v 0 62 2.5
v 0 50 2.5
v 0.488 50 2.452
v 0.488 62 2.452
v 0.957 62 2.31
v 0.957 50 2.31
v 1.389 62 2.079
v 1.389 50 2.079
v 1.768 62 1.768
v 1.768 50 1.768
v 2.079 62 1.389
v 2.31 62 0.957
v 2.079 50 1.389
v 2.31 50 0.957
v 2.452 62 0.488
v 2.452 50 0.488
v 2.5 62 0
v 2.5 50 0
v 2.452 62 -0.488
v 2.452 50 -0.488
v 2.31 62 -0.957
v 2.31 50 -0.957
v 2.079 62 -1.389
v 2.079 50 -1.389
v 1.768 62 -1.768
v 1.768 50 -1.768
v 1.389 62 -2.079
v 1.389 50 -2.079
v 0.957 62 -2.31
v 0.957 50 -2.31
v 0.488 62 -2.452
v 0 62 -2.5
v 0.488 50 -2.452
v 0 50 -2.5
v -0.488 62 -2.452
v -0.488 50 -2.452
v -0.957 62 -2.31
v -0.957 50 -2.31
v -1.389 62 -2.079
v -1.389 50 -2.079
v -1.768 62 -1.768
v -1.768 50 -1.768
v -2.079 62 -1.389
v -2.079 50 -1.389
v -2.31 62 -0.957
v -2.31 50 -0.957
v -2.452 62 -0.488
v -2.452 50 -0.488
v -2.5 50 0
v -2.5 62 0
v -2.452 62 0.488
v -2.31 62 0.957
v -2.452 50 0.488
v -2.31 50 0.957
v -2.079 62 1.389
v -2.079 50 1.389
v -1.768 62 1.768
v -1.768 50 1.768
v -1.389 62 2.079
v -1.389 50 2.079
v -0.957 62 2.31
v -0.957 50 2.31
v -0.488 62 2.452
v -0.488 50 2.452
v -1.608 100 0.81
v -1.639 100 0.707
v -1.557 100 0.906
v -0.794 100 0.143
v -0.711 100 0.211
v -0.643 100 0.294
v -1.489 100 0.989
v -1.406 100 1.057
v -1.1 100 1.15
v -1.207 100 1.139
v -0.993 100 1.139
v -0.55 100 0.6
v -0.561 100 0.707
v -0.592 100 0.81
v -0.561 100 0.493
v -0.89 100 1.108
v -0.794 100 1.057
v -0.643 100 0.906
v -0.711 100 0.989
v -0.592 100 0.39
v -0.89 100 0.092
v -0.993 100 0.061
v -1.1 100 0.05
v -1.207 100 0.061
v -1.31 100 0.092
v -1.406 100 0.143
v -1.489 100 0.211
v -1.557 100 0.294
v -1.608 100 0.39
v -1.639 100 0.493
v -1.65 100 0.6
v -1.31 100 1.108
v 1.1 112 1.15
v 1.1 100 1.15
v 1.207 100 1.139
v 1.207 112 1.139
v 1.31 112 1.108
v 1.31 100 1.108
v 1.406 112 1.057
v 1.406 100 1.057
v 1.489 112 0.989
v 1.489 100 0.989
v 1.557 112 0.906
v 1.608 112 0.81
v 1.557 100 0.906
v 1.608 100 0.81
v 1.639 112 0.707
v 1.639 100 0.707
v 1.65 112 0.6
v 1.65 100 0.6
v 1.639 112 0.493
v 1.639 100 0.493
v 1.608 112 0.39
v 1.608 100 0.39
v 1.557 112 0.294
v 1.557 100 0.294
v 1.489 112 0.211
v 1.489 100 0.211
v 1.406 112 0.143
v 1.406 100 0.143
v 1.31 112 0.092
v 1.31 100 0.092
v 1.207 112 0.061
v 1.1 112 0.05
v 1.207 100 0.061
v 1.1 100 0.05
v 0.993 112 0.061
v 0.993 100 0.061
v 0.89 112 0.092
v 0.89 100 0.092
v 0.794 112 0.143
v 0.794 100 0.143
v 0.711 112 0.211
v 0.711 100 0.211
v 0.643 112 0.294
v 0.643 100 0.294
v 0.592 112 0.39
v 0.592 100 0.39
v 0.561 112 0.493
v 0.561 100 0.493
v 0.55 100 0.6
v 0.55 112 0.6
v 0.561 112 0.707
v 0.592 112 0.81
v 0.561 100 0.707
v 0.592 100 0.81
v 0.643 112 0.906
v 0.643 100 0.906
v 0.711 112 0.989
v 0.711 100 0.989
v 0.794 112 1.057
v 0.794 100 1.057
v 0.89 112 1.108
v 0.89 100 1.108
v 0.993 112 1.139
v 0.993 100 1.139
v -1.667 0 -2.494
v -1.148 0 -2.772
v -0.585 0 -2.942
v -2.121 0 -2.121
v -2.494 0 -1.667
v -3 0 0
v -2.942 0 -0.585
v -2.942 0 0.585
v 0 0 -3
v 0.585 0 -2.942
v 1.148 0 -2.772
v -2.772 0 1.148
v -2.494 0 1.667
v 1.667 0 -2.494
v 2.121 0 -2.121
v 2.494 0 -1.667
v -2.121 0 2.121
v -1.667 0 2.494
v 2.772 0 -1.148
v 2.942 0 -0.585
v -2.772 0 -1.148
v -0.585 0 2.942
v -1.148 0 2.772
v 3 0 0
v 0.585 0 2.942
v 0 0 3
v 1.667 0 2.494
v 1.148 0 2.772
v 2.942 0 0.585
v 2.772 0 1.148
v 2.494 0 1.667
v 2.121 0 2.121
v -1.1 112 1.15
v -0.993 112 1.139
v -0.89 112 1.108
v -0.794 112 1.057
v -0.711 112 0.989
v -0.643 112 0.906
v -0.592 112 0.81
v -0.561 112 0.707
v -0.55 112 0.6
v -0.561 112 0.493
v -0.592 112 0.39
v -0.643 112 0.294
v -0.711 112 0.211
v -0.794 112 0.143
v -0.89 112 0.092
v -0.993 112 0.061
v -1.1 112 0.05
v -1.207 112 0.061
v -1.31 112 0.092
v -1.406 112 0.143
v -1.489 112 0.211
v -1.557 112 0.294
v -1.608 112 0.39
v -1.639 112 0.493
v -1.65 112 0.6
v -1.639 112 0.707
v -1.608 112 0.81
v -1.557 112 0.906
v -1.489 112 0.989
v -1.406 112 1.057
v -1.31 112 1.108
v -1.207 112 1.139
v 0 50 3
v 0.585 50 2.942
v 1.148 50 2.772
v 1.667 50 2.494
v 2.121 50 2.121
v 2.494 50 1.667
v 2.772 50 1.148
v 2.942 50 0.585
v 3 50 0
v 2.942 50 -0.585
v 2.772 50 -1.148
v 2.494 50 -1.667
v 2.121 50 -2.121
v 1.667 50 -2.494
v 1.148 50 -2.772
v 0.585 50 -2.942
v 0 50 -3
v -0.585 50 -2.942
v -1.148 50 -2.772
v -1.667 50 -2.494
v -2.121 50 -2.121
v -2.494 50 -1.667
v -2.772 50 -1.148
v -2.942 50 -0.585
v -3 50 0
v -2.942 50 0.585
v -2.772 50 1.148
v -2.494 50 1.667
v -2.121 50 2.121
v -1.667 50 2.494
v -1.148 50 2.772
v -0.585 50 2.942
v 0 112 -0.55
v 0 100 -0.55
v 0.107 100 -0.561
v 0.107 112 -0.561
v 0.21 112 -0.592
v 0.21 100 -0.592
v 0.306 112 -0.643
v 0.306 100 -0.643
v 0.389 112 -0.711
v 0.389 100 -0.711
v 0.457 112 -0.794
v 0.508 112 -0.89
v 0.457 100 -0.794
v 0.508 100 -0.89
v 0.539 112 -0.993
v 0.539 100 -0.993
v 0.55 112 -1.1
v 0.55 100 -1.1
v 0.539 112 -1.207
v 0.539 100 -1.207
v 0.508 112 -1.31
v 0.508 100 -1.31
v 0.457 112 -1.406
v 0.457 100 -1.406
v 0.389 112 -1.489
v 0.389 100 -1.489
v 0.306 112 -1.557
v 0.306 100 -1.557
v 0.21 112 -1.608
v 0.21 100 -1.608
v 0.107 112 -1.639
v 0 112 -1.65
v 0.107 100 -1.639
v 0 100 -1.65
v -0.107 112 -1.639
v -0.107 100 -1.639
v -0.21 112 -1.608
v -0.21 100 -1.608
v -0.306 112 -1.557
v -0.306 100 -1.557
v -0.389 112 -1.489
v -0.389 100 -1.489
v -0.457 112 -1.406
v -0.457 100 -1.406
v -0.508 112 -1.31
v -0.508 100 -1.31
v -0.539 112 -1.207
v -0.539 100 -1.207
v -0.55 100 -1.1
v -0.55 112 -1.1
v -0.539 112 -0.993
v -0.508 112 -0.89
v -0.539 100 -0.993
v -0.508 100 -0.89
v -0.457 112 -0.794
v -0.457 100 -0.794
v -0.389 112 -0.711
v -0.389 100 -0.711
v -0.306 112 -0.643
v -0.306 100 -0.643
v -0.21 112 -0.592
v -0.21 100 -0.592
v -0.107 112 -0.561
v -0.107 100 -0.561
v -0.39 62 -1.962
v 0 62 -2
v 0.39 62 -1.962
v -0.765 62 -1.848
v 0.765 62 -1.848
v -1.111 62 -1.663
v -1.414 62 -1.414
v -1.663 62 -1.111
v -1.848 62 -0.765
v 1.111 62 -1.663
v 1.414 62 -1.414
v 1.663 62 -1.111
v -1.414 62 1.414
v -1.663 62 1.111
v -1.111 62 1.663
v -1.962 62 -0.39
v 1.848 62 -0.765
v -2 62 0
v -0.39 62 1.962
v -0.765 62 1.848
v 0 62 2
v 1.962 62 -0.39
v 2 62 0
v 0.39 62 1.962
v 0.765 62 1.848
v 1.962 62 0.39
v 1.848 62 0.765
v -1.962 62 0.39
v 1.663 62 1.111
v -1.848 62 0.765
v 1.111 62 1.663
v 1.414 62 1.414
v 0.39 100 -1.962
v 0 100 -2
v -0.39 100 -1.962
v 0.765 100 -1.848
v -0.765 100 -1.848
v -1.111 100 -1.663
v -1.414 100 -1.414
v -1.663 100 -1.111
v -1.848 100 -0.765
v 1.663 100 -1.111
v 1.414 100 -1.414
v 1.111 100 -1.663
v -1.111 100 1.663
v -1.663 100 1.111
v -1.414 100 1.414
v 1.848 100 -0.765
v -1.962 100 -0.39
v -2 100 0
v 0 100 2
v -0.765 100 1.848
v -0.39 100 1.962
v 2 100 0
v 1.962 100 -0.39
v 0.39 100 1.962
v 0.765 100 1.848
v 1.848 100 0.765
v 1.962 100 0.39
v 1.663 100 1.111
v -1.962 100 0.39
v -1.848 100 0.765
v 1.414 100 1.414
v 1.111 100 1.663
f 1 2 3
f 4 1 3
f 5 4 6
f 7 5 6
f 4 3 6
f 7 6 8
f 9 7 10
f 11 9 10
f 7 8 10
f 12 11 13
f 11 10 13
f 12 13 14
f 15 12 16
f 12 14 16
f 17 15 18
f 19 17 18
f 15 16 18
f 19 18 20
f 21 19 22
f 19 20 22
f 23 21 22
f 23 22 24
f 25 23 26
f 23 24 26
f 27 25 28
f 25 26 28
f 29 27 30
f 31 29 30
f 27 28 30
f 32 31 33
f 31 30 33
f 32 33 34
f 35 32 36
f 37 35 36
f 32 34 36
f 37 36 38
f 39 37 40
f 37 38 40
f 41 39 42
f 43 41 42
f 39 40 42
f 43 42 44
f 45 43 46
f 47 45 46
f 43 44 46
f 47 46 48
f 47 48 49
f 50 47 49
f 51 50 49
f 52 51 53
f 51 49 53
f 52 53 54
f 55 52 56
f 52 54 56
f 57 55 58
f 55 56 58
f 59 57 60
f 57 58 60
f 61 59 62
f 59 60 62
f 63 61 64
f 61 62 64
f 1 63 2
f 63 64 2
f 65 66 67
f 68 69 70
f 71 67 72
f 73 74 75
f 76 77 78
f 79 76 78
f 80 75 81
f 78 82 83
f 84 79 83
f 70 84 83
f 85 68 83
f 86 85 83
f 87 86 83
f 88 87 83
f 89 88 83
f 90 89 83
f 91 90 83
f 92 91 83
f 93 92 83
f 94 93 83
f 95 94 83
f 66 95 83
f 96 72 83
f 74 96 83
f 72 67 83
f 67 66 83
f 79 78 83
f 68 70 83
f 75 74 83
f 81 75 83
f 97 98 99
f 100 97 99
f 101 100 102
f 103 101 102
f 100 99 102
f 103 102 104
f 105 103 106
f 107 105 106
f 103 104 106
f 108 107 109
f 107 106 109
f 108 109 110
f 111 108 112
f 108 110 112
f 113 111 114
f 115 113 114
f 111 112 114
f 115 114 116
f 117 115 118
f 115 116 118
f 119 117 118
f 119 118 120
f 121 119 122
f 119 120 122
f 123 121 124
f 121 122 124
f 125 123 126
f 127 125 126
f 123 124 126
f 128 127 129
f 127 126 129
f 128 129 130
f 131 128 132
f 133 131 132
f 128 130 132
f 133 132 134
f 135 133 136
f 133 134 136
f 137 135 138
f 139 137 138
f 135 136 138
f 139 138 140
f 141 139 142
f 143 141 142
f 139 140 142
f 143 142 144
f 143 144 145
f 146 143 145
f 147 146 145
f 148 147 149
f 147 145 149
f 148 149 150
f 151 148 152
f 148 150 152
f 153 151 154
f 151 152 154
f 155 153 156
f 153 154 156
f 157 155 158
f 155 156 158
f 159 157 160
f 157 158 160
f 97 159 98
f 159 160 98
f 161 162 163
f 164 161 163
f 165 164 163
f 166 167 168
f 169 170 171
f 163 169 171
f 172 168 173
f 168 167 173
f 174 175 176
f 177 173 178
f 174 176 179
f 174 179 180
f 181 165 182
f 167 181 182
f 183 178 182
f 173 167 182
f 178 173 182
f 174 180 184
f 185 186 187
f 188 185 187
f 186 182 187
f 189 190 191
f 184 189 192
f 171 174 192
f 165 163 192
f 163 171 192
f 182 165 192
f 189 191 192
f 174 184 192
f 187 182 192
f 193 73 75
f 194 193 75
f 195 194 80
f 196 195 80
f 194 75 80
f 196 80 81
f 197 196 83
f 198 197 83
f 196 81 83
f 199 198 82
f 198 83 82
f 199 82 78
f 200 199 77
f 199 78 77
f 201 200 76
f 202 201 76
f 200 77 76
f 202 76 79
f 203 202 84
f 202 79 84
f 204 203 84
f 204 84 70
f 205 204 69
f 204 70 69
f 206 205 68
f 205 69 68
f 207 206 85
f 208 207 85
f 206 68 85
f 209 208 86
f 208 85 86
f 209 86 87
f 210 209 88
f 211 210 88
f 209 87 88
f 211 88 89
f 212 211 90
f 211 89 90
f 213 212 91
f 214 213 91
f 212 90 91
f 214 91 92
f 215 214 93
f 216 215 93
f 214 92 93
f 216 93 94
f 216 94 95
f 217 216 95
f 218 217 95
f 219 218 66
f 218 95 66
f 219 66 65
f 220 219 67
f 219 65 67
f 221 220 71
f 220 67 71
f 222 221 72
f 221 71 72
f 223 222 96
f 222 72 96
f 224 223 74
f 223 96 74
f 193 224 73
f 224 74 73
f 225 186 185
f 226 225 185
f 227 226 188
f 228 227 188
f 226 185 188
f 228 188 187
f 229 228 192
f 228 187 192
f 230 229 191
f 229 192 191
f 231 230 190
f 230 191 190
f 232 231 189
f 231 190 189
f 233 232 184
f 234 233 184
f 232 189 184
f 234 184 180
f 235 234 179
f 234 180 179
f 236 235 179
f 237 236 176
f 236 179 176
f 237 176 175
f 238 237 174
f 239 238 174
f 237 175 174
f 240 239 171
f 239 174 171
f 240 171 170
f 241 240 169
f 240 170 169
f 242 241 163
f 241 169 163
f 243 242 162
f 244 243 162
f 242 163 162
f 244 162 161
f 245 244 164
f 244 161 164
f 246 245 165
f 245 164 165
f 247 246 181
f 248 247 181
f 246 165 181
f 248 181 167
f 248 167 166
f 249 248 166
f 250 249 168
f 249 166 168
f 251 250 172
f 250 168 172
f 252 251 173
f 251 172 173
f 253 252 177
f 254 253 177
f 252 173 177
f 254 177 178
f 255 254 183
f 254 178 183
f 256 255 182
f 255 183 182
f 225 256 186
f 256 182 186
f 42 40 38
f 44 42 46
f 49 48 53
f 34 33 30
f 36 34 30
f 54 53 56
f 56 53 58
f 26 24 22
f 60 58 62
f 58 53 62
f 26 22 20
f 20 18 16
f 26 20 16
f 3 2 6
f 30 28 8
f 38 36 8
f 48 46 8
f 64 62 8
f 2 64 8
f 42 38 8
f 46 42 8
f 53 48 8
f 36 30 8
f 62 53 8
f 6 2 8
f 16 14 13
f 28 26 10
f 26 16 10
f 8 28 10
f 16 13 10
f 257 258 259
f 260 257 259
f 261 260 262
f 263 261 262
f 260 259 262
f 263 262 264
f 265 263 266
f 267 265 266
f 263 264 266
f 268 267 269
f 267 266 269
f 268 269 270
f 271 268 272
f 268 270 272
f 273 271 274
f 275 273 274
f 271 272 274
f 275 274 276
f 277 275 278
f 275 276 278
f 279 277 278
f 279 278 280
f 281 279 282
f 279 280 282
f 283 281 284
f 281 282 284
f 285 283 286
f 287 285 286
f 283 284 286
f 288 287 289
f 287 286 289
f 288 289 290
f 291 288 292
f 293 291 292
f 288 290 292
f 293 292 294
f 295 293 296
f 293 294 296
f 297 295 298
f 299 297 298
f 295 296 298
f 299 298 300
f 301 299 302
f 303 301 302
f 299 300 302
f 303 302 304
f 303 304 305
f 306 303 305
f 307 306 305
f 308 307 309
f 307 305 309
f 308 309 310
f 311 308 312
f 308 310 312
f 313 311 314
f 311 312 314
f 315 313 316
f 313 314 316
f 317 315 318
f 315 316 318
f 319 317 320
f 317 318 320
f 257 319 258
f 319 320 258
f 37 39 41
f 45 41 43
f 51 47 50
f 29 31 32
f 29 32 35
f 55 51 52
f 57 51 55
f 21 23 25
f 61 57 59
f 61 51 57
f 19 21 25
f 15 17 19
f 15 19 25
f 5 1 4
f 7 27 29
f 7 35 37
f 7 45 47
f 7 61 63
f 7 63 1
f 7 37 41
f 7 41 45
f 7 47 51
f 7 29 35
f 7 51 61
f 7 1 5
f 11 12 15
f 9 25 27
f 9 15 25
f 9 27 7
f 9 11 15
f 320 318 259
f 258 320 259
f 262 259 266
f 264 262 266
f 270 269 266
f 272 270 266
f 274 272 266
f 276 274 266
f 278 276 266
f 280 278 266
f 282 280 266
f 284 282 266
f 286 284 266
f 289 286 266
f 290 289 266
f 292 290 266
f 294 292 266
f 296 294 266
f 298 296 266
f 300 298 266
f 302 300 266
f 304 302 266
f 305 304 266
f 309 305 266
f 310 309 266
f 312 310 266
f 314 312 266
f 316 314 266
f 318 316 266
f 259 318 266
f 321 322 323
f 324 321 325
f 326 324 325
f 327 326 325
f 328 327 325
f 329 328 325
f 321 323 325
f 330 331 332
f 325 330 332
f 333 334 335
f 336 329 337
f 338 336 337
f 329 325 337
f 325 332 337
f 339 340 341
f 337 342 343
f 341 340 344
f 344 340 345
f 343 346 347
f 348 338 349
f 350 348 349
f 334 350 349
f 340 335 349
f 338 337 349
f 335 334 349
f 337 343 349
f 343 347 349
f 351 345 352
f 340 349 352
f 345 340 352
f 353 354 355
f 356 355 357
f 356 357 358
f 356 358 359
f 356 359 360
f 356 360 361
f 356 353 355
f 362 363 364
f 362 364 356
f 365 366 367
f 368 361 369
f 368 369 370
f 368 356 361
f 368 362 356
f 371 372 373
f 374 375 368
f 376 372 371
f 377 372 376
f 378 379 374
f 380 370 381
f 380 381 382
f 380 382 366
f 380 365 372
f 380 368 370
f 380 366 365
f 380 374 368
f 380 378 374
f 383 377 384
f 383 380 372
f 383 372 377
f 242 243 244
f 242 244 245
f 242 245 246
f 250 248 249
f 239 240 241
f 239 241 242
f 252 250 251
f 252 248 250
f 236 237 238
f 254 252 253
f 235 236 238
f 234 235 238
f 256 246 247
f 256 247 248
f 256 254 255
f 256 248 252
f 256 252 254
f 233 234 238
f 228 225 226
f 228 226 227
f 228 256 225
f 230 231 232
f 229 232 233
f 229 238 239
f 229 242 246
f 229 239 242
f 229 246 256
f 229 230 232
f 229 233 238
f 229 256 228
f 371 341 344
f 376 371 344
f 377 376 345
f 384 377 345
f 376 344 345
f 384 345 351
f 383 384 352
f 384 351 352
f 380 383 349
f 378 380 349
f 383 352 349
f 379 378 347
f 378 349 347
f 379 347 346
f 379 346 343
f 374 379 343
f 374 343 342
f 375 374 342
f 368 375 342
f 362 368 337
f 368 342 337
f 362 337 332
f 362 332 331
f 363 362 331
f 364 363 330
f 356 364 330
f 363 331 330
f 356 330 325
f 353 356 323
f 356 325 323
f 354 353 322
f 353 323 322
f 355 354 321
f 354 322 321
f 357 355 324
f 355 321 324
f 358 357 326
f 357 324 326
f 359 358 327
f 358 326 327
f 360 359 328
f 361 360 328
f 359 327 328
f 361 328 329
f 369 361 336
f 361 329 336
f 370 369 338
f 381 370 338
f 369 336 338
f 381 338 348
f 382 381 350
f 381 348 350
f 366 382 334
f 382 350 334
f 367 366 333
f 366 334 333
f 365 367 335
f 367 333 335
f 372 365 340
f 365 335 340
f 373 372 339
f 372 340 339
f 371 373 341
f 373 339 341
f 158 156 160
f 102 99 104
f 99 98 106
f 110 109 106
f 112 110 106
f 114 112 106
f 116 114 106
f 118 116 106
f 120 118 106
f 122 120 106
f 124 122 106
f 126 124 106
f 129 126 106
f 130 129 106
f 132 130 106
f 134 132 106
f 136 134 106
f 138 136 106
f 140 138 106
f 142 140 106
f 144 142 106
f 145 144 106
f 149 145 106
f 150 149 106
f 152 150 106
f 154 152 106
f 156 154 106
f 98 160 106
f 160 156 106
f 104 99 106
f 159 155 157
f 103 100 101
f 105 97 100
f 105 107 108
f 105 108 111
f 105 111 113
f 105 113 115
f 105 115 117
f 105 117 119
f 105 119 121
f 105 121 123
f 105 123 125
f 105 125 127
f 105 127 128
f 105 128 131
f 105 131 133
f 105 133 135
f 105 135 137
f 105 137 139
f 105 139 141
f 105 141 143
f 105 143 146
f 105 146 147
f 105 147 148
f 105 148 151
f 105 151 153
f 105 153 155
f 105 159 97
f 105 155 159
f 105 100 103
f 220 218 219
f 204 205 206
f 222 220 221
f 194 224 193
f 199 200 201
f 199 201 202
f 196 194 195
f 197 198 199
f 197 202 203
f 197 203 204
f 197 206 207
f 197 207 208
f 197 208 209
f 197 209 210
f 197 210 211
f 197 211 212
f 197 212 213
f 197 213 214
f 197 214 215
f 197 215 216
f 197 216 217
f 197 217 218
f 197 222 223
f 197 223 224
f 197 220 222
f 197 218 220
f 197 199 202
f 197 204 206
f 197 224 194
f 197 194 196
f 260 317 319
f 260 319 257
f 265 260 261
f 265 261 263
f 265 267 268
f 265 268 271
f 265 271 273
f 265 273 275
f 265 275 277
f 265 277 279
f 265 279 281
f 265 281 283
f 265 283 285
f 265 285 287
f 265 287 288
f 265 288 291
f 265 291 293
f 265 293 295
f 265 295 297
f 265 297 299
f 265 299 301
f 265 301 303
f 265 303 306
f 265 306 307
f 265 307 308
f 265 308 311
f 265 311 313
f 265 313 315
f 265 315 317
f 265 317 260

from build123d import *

# Parameters (mm, degrees)
SK_STAINLESS_SHEATH_R  = 3
STAINLESS_SHEATH_DEPTH = 50
SLEEVE_START           = 50
SK_SLEEVE_R            = 2.5
SLEEVE_DEPTH           = 12
CABLE_START            = 62
SK_CABLE_R             = 2
CABLE_DEPTH            = 38
WIRE_START             = 100
SK_WIRE_RED_VDD_R      = 0.55
WIRE_RED_VDD_DEPTH     = 12
SK_WIRE_BLACK_GND_R    = 0.55
WIRE_BLACK_GND_DEPTH   = 12
SK_WIRE_YELLOW_DQ_R    = 0.55
WIRE_YELLOW_DQ_DEPTH   = 12


with BuildPart() as part:
    # SK Stainless sheath → Stainless sheath (new body)
    with BuildSketch(Plane(origin=(0, 0, 0), x_dir=(1, 0, 0), z_dir=(0, 1, 0))):
        with Locations(Location((0, 0, 0), (0, 0, 270))):
            Circle(SK_STAINLESS_SHEATH_R)
    extrude(amount=STAINLESS_SHEATH_DEPTH)


with BuildPart() as body_2:
    # SK Sleeve → Sleeve (new body)
    with BuildSketch(Plane(origin=(0, 0, 0), x_dir=(1, 0, 0), z_dir=(0, 1, 0)).offset(SLEEVE_START)):
        with Locations(Location((0, 0, 0), (0, 0, 270))):
            Circle(SK_SLEEVE_R)
    extrude(amount=SLEEVE_DEPTH)


with BuildPart() as body_3:
    # SK Cable → Cable (new body)
    with BuildSketch(Plane(origin=(0, 0, 0), x_dir=(1, 0, 0), z_dir=(0, 1, 0)).offset(CABLE_START)):
        with Locations(Location((0, 0, 0), (0, 0, 270))):
            Circle(SK_CABLE_R)
    extrude(amount=CABLE_DEPTH)


with BuildPart() as body_4:
    # SK Wire red VDD → Wire red VDD (new body)
    with BuildSketch(Plane(origin=(0, 0, 0), x_dir=(1, 0, 0), z_dir=(0, 1, 0)).offset(WIRE_START)):
        with Locations(Location((-1.1, -0.6, 0), (0, 0, 270))):
            Circle(SK_WIRE_RED_VDD_R)
    extrude(amount=WIRE_RED_VDD_DEPTH)


with BuildPart() as body_5:
    # SK Wire black GND → Wire black GND (new body)
    with BuildSketch(Plane(origin=(0, 0, 0), x_dir=(1, 0, 0), z_dir=(0, 1, 0)).offset(WIRE_START)):
        with Locations(Location((1.1, -0.6, 0), (0, 0, 270))):
            Circle(SK_WIRE_BLACK_GND_R)
    extrude(amount=WIRE_BLACK_GND_DEPTH)


with BuildPart() as body_6:
    # SK Wire yellow DQ → Wire yellow DQ (new body)
    with BuildSketch(Plane(origin=(0, 0, 0), x_dir=(1, 0, 0), z_dir=(0, 1, 0)).offset(WIRE_START)):
        with Locations(Location((0, 1.1, 0), (0, 0, 270))):
            Circle(SK_WIRE_YELLOW_DQ_R)
    extrude(amount=WIRE_YELLOW_DQ_DEPTH)


solid = Compound([part.part, body_2.part, body_3.part, body_4.part, body_5.part, body_6.part])
